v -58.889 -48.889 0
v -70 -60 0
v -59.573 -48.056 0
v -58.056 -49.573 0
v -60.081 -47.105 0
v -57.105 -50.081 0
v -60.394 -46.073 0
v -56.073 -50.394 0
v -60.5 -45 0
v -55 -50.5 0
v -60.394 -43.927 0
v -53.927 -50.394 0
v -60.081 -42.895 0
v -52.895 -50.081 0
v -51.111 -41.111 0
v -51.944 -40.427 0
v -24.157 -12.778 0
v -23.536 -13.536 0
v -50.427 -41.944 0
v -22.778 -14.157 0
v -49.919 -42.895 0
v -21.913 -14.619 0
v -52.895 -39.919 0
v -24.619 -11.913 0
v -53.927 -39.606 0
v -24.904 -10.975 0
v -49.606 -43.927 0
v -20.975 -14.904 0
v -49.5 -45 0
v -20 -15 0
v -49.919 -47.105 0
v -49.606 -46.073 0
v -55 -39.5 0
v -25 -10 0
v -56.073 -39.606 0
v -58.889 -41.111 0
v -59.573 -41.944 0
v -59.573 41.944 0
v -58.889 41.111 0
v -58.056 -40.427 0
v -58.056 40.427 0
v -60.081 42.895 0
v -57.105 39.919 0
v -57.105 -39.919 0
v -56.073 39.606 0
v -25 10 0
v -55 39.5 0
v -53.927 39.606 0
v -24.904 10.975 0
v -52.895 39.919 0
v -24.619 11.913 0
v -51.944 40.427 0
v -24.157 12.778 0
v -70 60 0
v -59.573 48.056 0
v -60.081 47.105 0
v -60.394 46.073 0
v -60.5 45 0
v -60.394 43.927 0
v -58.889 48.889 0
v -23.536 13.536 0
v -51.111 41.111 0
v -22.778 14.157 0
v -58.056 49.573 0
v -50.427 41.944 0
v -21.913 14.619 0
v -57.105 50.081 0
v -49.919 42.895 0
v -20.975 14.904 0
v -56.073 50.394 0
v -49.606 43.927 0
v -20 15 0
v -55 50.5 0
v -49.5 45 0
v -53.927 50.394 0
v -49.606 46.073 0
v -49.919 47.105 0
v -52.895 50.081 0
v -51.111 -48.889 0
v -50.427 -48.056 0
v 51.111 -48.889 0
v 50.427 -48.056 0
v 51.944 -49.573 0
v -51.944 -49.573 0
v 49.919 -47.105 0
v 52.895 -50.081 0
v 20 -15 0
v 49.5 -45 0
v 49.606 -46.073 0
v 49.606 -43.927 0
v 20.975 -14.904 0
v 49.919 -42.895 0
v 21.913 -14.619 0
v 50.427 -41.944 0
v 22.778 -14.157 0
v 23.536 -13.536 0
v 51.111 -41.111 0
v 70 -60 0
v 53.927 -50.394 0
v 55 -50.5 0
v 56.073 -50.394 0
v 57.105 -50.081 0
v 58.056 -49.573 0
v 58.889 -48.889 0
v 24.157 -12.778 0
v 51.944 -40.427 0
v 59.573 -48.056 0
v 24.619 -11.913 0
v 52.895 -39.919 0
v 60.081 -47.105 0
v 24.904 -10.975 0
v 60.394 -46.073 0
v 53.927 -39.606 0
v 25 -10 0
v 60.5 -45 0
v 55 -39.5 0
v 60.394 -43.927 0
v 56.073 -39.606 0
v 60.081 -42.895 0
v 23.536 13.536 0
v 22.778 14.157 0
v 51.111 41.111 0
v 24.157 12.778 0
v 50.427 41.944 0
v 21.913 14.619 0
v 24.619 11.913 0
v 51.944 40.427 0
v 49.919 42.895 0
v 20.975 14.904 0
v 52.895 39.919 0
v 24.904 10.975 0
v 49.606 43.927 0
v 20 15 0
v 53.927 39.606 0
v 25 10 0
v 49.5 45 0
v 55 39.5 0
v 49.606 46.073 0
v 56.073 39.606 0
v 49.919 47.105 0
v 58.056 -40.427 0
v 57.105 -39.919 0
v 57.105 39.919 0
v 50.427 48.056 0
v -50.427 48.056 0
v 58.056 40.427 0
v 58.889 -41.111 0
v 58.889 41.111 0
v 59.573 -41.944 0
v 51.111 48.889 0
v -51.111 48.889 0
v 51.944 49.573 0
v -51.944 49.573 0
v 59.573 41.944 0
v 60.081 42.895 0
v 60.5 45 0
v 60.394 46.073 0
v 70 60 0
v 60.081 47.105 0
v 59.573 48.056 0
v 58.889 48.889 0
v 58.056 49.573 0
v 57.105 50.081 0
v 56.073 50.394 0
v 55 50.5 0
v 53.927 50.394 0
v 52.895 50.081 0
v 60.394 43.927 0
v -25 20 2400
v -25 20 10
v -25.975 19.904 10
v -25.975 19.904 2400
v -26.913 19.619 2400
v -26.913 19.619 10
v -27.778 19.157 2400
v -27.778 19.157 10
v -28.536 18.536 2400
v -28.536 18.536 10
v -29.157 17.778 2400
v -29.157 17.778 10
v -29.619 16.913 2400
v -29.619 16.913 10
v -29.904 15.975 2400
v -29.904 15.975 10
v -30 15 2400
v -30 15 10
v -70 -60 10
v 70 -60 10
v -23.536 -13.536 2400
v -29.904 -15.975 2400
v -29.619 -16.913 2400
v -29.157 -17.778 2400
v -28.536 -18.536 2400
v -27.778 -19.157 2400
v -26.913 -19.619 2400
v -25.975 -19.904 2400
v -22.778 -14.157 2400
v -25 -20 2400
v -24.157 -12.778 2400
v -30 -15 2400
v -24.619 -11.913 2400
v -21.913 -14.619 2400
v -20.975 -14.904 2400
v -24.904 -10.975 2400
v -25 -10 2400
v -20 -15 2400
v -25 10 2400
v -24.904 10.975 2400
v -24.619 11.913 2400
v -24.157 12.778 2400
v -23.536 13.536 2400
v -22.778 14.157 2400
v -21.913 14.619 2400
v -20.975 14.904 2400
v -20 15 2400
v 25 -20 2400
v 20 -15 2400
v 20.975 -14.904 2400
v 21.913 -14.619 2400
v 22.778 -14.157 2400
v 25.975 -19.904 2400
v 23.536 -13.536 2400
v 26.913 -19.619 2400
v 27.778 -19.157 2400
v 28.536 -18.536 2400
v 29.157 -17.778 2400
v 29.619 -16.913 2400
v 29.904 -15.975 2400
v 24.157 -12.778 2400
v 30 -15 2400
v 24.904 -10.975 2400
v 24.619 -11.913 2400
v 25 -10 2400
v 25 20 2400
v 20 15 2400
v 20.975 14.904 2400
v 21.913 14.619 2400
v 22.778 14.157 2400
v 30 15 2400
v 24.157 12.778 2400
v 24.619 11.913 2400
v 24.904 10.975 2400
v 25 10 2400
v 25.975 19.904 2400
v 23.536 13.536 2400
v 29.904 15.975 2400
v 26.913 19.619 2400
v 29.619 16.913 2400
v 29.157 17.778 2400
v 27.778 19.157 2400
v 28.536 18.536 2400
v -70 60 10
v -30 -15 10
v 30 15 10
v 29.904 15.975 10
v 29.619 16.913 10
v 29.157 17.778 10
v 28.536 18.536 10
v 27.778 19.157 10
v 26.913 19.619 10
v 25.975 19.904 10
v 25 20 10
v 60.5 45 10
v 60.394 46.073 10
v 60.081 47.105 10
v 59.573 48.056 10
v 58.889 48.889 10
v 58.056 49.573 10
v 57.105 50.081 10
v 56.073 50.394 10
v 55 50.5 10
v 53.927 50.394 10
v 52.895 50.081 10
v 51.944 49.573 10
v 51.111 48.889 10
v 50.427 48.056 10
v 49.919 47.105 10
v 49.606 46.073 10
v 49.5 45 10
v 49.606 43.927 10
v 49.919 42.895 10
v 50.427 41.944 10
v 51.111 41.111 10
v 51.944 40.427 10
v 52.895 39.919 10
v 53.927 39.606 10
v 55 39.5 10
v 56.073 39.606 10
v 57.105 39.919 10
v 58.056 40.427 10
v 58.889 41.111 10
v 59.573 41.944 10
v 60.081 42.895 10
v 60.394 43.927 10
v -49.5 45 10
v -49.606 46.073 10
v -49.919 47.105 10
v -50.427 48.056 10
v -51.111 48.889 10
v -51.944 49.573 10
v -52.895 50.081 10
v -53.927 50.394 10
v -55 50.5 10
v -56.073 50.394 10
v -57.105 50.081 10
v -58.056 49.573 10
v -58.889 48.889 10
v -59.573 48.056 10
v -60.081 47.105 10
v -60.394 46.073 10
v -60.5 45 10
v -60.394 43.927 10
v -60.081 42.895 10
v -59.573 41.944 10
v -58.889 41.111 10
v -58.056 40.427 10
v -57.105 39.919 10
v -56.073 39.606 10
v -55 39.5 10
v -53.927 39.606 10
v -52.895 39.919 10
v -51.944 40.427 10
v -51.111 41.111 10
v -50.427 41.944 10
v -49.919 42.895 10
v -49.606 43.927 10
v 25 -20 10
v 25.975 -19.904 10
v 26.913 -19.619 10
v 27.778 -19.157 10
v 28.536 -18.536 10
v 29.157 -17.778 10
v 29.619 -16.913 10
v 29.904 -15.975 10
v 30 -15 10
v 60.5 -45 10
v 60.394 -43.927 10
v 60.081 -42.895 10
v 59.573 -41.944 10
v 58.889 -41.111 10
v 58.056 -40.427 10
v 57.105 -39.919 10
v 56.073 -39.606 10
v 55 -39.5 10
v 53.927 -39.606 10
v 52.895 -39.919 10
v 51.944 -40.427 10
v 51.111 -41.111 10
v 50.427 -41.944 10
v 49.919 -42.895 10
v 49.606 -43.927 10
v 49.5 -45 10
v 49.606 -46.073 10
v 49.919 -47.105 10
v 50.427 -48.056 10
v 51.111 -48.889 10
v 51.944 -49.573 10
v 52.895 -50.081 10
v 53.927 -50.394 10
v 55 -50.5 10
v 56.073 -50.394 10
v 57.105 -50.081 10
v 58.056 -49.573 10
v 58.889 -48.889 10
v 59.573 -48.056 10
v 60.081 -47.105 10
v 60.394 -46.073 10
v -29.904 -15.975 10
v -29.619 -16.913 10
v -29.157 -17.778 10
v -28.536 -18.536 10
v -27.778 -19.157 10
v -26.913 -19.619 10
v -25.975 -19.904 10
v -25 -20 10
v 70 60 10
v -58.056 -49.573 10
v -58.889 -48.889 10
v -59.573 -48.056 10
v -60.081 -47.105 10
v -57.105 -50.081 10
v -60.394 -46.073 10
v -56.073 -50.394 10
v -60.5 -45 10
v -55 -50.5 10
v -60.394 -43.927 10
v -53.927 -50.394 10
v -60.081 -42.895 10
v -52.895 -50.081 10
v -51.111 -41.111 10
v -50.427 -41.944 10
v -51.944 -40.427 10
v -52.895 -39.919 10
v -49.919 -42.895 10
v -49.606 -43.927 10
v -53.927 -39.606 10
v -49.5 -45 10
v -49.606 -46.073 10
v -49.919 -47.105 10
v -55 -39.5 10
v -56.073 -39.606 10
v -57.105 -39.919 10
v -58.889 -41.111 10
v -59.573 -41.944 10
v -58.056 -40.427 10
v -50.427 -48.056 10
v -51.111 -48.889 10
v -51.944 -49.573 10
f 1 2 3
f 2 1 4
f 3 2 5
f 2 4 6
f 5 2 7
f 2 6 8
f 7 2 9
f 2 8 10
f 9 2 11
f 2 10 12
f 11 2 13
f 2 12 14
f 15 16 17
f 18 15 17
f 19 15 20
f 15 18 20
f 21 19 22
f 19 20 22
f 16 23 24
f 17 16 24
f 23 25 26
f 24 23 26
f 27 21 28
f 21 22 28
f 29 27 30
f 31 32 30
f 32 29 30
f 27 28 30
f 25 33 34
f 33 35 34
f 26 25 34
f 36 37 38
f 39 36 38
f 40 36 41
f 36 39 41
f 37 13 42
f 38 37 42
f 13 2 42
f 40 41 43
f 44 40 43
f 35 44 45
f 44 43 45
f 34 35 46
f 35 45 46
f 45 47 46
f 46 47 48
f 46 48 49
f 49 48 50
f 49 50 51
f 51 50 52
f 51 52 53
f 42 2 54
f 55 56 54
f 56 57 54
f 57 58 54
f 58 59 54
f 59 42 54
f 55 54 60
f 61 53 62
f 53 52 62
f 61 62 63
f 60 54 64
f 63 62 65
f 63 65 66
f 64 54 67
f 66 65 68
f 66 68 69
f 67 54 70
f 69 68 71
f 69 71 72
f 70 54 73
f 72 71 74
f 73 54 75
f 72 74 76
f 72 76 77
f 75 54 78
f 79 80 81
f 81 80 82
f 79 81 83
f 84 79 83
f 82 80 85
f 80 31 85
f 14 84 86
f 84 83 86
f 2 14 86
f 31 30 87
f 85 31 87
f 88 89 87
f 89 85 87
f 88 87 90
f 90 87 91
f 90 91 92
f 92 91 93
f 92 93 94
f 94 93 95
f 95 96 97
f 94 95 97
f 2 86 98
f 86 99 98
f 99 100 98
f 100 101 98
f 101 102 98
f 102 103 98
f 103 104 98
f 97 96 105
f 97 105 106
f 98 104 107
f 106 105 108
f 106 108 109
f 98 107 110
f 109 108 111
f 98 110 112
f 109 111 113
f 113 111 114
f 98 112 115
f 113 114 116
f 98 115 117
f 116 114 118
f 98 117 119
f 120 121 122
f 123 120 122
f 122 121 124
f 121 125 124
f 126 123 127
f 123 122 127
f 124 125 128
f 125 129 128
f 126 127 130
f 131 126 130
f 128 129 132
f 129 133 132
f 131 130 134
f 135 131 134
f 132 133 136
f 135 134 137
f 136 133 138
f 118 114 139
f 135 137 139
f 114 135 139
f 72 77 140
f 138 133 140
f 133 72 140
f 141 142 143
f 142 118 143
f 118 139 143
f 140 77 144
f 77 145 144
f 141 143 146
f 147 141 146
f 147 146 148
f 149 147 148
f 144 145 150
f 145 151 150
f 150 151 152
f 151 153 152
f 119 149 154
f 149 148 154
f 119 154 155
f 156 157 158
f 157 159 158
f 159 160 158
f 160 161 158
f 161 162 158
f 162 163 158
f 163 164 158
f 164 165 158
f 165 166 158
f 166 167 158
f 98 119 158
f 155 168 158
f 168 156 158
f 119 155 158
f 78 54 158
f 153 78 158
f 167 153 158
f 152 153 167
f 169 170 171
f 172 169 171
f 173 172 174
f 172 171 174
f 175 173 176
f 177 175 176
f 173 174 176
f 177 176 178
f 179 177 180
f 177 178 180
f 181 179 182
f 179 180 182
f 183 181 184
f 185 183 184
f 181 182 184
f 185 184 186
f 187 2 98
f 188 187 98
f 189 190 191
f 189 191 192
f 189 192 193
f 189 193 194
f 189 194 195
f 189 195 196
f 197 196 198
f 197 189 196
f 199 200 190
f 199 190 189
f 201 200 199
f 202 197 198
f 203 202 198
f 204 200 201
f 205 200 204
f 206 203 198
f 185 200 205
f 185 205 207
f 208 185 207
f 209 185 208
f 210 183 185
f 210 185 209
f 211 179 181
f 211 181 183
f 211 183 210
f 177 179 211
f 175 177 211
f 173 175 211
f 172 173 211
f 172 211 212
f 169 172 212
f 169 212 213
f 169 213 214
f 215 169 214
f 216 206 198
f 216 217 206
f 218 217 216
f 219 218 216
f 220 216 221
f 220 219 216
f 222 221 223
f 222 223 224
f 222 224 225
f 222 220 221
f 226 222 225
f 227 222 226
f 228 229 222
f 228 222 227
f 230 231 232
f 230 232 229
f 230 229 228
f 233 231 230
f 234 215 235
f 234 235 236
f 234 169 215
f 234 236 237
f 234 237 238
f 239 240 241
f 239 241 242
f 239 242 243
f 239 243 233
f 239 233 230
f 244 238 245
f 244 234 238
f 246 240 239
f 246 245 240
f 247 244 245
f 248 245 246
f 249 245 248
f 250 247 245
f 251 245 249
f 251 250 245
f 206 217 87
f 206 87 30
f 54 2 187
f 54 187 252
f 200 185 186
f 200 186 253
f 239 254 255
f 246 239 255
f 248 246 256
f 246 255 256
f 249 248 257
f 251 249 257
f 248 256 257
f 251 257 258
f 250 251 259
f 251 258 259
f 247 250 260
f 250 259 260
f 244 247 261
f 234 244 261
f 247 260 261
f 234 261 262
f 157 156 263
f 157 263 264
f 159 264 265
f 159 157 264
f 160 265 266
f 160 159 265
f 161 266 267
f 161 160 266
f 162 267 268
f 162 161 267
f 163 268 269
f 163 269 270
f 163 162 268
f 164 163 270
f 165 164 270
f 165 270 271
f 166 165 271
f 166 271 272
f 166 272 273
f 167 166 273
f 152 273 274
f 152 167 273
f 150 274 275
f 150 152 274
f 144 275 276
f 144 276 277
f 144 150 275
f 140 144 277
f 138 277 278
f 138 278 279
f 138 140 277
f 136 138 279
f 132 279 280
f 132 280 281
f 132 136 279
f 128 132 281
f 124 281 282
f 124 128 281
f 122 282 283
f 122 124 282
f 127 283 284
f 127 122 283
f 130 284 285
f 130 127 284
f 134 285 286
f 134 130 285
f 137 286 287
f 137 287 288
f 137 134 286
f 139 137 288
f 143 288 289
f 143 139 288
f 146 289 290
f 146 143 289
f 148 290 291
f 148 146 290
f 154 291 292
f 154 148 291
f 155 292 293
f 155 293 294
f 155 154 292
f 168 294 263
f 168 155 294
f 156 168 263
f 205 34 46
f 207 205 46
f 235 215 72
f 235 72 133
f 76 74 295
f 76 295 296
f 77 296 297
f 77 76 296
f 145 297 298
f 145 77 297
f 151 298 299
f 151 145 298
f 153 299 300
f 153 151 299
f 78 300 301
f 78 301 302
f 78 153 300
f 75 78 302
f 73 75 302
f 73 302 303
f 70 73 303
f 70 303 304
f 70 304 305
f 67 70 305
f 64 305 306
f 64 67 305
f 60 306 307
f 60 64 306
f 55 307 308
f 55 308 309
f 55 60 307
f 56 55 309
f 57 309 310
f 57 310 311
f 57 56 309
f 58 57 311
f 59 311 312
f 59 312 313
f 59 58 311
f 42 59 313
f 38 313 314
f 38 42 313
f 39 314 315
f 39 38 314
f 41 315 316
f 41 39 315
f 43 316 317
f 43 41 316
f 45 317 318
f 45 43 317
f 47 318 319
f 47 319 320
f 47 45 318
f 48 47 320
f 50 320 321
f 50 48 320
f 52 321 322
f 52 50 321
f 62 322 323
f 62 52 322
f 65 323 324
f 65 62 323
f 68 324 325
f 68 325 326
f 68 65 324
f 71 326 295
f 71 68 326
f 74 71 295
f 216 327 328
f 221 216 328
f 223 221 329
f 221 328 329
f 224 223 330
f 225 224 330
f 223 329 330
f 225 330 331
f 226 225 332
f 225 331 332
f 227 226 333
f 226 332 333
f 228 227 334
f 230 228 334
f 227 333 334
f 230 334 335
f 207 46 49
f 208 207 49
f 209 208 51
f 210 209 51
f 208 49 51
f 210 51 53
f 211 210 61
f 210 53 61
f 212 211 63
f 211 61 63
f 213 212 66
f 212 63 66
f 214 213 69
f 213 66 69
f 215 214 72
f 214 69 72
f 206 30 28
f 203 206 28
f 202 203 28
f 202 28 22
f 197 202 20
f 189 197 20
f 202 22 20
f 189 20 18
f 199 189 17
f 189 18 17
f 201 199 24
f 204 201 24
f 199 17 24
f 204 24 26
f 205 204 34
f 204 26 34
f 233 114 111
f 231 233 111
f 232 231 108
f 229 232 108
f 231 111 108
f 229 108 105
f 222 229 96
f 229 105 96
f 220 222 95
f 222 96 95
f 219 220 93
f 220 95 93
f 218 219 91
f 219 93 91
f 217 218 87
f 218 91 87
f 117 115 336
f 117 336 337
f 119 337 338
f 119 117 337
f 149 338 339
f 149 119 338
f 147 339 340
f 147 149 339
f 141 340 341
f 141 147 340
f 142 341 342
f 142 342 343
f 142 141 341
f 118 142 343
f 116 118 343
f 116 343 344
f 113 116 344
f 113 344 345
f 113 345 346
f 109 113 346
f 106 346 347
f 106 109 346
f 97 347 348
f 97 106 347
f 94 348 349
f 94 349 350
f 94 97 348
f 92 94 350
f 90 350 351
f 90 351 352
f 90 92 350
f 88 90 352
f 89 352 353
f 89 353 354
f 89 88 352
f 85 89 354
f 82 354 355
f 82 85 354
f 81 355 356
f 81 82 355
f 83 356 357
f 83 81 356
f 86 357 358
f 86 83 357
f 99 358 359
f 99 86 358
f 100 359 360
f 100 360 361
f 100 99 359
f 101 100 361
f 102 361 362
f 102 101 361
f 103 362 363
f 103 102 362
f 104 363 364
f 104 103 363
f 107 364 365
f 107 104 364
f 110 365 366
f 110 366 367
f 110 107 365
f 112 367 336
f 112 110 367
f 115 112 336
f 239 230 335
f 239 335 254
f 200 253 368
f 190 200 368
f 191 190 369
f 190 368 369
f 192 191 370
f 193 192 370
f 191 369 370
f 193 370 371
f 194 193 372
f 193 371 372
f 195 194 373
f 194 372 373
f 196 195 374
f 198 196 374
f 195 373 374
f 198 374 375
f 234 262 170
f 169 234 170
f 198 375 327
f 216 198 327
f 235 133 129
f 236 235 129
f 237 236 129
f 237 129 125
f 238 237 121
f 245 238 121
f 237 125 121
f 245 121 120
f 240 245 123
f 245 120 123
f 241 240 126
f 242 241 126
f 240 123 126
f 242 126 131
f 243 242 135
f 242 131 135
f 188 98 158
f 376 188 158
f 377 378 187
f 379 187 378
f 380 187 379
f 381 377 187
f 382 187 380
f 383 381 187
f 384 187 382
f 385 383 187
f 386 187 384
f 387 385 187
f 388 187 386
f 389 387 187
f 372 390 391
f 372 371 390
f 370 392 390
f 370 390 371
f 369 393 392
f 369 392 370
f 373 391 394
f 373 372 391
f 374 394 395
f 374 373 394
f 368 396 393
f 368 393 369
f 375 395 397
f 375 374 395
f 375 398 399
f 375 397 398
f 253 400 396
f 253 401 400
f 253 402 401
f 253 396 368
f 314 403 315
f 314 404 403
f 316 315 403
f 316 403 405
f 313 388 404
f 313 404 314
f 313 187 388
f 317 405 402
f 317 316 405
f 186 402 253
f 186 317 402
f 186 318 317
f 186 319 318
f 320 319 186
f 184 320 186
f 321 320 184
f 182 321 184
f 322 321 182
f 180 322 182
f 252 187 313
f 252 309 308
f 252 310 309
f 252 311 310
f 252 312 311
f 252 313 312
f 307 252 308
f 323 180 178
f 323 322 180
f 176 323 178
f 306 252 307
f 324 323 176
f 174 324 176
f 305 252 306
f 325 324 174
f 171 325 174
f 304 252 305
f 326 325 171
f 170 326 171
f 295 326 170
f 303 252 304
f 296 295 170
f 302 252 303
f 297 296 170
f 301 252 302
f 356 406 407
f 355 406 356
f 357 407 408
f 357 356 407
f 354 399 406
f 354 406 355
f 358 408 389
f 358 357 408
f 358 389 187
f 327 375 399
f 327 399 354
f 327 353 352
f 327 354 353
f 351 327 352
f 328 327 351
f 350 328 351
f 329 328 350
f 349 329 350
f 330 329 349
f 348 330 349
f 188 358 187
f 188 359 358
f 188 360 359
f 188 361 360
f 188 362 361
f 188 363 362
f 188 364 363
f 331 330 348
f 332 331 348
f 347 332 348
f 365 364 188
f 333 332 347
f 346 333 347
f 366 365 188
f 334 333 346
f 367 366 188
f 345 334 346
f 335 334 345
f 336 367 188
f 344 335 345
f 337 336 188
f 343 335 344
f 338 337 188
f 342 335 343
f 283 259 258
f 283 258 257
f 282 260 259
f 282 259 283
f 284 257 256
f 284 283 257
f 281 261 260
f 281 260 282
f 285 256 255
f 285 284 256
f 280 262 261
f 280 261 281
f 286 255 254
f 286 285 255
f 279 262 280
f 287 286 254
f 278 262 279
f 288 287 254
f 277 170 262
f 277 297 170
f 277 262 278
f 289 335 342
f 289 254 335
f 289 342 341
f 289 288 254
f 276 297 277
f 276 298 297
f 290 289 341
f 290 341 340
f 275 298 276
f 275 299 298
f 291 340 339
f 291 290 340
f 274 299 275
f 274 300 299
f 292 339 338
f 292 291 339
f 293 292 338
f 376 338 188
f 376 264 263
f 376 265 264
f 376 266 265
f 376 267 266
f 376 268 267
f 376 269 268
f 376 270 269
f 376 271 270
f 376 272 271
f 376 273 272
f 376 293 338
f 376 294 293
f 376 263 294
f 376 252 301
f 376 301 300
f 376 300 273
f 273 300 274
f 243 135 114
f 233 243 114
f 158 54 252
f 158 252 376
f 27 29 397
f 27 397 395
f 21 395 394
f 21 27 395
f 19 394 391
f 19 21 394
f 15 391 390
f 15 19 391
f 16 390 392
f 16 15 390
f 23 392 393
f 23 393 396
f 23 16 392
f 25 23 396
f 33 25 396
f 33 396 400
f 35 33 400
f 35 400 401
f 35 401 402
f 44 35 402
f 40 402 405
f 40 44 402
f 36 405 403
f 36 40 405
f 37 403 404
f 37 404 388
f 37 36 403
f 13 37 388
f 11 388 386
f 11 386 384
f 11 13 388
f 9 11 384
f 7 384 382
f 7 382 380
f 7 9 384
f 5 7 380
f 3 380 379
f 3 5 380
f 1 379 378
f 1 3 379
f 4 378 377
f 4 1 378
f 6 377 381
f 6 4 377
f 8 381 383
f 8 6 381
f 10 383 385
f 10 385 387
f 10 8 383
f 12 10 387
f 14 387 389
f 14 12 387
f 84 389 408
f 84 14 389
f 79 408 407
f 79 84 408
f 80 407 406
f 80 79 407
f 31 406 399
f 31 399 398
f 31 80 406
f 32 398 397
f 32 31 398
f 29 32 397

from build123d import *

# Parameters (mm, degrees)
F0_W     = 140
F0_H     = 120
F0_R     = 5.5
F1_DEPTH = 10
F2_DEPTH = 2400


with BuildPart() as f1:
    # F0 (on Top) → F1 (new body)
    with BuildSketch(Plane.XY):
        Rectangle(F0_W, F0_H)
        with Locations((-55, -45)):
            Circle(F0_R, mode=Mode.SUBTRACT)
        with Locations((55, -45)):
            Circle(F0_R, mode=Mode.SUBTRACT)
        with Locations((-55, 45)):
            Circle(F0_R, mode=Mode.SUBTRACT)
        with BuildLine():
            ThreePointArc((-30, 15), (-28.535534, 18.535534), (-25, 20))
            Line((-25, 20), (25, 20))
            ThreePointArc((25, 20), (28.535534, 18.535534), (30, 15))
            Line((30, 15), (30, -15))
            ThreePointArc((30, -15), (28.535534, -18.535534), (25, -20))
            Line((25, -20), (-25, -20))
            ThreePointArc((-25, -20), (-28.535534, -18.535534), (-30, -15))
            Line((-30, -15), (-30, 15))
        make_face(mode=Mode.SUBTRACT)
        with Locations((55, 45)):
            Circle(F0_R, mode=Mode.SUBTRACT)
    extrude(amount=F1_DEPTH)

    # F0 (on Top) → F2 (join)
    with BuildSketch(Plane.XY):
        with BuildLine():
            Line((25, 20), (-25, 20))
            ThreePointArc((-25, 20), (-28.535534, 18.535534), (-30, 15))
            Line((-30, 15), (-30, -15))
            ThreePointArc((-30, -15), (-28.535534, -18.535534), (-25, -20))
            Line((-25, -20), (25, -20))
            ThreePointArc((25, -20), (28.535534, -18.535534), (30, -15))
            Line((30, -15), (30, 15))
            ThreePointArc((30, 15), (28.535534, 18.535534), (25, 20))
        make_face()
        with BuildLine():
            ThreePointArc((-25, 10), (-23.535534, 13.535534), (-20, 15))
            Line((-20, 15), (20, 15))
            ThreePointArc((20, 15), (23.535534, 13.535534), (25, 10))
            Line((25, 10), (25, -10))
            ThreePointArc((25, -10), (23.535534, -13.535534), (20, -15))
            Line((20, -15), (-20, -15))
            ThreePointArc((-20, -15), (-23.535534, -13.535534), (-25, -10))
            Line((-25, -10), (-25, 10))
        make_face(mode=Mode.SUBTRACT)
    extrude(amount=F2_DEPTH)


solid = f1.part
